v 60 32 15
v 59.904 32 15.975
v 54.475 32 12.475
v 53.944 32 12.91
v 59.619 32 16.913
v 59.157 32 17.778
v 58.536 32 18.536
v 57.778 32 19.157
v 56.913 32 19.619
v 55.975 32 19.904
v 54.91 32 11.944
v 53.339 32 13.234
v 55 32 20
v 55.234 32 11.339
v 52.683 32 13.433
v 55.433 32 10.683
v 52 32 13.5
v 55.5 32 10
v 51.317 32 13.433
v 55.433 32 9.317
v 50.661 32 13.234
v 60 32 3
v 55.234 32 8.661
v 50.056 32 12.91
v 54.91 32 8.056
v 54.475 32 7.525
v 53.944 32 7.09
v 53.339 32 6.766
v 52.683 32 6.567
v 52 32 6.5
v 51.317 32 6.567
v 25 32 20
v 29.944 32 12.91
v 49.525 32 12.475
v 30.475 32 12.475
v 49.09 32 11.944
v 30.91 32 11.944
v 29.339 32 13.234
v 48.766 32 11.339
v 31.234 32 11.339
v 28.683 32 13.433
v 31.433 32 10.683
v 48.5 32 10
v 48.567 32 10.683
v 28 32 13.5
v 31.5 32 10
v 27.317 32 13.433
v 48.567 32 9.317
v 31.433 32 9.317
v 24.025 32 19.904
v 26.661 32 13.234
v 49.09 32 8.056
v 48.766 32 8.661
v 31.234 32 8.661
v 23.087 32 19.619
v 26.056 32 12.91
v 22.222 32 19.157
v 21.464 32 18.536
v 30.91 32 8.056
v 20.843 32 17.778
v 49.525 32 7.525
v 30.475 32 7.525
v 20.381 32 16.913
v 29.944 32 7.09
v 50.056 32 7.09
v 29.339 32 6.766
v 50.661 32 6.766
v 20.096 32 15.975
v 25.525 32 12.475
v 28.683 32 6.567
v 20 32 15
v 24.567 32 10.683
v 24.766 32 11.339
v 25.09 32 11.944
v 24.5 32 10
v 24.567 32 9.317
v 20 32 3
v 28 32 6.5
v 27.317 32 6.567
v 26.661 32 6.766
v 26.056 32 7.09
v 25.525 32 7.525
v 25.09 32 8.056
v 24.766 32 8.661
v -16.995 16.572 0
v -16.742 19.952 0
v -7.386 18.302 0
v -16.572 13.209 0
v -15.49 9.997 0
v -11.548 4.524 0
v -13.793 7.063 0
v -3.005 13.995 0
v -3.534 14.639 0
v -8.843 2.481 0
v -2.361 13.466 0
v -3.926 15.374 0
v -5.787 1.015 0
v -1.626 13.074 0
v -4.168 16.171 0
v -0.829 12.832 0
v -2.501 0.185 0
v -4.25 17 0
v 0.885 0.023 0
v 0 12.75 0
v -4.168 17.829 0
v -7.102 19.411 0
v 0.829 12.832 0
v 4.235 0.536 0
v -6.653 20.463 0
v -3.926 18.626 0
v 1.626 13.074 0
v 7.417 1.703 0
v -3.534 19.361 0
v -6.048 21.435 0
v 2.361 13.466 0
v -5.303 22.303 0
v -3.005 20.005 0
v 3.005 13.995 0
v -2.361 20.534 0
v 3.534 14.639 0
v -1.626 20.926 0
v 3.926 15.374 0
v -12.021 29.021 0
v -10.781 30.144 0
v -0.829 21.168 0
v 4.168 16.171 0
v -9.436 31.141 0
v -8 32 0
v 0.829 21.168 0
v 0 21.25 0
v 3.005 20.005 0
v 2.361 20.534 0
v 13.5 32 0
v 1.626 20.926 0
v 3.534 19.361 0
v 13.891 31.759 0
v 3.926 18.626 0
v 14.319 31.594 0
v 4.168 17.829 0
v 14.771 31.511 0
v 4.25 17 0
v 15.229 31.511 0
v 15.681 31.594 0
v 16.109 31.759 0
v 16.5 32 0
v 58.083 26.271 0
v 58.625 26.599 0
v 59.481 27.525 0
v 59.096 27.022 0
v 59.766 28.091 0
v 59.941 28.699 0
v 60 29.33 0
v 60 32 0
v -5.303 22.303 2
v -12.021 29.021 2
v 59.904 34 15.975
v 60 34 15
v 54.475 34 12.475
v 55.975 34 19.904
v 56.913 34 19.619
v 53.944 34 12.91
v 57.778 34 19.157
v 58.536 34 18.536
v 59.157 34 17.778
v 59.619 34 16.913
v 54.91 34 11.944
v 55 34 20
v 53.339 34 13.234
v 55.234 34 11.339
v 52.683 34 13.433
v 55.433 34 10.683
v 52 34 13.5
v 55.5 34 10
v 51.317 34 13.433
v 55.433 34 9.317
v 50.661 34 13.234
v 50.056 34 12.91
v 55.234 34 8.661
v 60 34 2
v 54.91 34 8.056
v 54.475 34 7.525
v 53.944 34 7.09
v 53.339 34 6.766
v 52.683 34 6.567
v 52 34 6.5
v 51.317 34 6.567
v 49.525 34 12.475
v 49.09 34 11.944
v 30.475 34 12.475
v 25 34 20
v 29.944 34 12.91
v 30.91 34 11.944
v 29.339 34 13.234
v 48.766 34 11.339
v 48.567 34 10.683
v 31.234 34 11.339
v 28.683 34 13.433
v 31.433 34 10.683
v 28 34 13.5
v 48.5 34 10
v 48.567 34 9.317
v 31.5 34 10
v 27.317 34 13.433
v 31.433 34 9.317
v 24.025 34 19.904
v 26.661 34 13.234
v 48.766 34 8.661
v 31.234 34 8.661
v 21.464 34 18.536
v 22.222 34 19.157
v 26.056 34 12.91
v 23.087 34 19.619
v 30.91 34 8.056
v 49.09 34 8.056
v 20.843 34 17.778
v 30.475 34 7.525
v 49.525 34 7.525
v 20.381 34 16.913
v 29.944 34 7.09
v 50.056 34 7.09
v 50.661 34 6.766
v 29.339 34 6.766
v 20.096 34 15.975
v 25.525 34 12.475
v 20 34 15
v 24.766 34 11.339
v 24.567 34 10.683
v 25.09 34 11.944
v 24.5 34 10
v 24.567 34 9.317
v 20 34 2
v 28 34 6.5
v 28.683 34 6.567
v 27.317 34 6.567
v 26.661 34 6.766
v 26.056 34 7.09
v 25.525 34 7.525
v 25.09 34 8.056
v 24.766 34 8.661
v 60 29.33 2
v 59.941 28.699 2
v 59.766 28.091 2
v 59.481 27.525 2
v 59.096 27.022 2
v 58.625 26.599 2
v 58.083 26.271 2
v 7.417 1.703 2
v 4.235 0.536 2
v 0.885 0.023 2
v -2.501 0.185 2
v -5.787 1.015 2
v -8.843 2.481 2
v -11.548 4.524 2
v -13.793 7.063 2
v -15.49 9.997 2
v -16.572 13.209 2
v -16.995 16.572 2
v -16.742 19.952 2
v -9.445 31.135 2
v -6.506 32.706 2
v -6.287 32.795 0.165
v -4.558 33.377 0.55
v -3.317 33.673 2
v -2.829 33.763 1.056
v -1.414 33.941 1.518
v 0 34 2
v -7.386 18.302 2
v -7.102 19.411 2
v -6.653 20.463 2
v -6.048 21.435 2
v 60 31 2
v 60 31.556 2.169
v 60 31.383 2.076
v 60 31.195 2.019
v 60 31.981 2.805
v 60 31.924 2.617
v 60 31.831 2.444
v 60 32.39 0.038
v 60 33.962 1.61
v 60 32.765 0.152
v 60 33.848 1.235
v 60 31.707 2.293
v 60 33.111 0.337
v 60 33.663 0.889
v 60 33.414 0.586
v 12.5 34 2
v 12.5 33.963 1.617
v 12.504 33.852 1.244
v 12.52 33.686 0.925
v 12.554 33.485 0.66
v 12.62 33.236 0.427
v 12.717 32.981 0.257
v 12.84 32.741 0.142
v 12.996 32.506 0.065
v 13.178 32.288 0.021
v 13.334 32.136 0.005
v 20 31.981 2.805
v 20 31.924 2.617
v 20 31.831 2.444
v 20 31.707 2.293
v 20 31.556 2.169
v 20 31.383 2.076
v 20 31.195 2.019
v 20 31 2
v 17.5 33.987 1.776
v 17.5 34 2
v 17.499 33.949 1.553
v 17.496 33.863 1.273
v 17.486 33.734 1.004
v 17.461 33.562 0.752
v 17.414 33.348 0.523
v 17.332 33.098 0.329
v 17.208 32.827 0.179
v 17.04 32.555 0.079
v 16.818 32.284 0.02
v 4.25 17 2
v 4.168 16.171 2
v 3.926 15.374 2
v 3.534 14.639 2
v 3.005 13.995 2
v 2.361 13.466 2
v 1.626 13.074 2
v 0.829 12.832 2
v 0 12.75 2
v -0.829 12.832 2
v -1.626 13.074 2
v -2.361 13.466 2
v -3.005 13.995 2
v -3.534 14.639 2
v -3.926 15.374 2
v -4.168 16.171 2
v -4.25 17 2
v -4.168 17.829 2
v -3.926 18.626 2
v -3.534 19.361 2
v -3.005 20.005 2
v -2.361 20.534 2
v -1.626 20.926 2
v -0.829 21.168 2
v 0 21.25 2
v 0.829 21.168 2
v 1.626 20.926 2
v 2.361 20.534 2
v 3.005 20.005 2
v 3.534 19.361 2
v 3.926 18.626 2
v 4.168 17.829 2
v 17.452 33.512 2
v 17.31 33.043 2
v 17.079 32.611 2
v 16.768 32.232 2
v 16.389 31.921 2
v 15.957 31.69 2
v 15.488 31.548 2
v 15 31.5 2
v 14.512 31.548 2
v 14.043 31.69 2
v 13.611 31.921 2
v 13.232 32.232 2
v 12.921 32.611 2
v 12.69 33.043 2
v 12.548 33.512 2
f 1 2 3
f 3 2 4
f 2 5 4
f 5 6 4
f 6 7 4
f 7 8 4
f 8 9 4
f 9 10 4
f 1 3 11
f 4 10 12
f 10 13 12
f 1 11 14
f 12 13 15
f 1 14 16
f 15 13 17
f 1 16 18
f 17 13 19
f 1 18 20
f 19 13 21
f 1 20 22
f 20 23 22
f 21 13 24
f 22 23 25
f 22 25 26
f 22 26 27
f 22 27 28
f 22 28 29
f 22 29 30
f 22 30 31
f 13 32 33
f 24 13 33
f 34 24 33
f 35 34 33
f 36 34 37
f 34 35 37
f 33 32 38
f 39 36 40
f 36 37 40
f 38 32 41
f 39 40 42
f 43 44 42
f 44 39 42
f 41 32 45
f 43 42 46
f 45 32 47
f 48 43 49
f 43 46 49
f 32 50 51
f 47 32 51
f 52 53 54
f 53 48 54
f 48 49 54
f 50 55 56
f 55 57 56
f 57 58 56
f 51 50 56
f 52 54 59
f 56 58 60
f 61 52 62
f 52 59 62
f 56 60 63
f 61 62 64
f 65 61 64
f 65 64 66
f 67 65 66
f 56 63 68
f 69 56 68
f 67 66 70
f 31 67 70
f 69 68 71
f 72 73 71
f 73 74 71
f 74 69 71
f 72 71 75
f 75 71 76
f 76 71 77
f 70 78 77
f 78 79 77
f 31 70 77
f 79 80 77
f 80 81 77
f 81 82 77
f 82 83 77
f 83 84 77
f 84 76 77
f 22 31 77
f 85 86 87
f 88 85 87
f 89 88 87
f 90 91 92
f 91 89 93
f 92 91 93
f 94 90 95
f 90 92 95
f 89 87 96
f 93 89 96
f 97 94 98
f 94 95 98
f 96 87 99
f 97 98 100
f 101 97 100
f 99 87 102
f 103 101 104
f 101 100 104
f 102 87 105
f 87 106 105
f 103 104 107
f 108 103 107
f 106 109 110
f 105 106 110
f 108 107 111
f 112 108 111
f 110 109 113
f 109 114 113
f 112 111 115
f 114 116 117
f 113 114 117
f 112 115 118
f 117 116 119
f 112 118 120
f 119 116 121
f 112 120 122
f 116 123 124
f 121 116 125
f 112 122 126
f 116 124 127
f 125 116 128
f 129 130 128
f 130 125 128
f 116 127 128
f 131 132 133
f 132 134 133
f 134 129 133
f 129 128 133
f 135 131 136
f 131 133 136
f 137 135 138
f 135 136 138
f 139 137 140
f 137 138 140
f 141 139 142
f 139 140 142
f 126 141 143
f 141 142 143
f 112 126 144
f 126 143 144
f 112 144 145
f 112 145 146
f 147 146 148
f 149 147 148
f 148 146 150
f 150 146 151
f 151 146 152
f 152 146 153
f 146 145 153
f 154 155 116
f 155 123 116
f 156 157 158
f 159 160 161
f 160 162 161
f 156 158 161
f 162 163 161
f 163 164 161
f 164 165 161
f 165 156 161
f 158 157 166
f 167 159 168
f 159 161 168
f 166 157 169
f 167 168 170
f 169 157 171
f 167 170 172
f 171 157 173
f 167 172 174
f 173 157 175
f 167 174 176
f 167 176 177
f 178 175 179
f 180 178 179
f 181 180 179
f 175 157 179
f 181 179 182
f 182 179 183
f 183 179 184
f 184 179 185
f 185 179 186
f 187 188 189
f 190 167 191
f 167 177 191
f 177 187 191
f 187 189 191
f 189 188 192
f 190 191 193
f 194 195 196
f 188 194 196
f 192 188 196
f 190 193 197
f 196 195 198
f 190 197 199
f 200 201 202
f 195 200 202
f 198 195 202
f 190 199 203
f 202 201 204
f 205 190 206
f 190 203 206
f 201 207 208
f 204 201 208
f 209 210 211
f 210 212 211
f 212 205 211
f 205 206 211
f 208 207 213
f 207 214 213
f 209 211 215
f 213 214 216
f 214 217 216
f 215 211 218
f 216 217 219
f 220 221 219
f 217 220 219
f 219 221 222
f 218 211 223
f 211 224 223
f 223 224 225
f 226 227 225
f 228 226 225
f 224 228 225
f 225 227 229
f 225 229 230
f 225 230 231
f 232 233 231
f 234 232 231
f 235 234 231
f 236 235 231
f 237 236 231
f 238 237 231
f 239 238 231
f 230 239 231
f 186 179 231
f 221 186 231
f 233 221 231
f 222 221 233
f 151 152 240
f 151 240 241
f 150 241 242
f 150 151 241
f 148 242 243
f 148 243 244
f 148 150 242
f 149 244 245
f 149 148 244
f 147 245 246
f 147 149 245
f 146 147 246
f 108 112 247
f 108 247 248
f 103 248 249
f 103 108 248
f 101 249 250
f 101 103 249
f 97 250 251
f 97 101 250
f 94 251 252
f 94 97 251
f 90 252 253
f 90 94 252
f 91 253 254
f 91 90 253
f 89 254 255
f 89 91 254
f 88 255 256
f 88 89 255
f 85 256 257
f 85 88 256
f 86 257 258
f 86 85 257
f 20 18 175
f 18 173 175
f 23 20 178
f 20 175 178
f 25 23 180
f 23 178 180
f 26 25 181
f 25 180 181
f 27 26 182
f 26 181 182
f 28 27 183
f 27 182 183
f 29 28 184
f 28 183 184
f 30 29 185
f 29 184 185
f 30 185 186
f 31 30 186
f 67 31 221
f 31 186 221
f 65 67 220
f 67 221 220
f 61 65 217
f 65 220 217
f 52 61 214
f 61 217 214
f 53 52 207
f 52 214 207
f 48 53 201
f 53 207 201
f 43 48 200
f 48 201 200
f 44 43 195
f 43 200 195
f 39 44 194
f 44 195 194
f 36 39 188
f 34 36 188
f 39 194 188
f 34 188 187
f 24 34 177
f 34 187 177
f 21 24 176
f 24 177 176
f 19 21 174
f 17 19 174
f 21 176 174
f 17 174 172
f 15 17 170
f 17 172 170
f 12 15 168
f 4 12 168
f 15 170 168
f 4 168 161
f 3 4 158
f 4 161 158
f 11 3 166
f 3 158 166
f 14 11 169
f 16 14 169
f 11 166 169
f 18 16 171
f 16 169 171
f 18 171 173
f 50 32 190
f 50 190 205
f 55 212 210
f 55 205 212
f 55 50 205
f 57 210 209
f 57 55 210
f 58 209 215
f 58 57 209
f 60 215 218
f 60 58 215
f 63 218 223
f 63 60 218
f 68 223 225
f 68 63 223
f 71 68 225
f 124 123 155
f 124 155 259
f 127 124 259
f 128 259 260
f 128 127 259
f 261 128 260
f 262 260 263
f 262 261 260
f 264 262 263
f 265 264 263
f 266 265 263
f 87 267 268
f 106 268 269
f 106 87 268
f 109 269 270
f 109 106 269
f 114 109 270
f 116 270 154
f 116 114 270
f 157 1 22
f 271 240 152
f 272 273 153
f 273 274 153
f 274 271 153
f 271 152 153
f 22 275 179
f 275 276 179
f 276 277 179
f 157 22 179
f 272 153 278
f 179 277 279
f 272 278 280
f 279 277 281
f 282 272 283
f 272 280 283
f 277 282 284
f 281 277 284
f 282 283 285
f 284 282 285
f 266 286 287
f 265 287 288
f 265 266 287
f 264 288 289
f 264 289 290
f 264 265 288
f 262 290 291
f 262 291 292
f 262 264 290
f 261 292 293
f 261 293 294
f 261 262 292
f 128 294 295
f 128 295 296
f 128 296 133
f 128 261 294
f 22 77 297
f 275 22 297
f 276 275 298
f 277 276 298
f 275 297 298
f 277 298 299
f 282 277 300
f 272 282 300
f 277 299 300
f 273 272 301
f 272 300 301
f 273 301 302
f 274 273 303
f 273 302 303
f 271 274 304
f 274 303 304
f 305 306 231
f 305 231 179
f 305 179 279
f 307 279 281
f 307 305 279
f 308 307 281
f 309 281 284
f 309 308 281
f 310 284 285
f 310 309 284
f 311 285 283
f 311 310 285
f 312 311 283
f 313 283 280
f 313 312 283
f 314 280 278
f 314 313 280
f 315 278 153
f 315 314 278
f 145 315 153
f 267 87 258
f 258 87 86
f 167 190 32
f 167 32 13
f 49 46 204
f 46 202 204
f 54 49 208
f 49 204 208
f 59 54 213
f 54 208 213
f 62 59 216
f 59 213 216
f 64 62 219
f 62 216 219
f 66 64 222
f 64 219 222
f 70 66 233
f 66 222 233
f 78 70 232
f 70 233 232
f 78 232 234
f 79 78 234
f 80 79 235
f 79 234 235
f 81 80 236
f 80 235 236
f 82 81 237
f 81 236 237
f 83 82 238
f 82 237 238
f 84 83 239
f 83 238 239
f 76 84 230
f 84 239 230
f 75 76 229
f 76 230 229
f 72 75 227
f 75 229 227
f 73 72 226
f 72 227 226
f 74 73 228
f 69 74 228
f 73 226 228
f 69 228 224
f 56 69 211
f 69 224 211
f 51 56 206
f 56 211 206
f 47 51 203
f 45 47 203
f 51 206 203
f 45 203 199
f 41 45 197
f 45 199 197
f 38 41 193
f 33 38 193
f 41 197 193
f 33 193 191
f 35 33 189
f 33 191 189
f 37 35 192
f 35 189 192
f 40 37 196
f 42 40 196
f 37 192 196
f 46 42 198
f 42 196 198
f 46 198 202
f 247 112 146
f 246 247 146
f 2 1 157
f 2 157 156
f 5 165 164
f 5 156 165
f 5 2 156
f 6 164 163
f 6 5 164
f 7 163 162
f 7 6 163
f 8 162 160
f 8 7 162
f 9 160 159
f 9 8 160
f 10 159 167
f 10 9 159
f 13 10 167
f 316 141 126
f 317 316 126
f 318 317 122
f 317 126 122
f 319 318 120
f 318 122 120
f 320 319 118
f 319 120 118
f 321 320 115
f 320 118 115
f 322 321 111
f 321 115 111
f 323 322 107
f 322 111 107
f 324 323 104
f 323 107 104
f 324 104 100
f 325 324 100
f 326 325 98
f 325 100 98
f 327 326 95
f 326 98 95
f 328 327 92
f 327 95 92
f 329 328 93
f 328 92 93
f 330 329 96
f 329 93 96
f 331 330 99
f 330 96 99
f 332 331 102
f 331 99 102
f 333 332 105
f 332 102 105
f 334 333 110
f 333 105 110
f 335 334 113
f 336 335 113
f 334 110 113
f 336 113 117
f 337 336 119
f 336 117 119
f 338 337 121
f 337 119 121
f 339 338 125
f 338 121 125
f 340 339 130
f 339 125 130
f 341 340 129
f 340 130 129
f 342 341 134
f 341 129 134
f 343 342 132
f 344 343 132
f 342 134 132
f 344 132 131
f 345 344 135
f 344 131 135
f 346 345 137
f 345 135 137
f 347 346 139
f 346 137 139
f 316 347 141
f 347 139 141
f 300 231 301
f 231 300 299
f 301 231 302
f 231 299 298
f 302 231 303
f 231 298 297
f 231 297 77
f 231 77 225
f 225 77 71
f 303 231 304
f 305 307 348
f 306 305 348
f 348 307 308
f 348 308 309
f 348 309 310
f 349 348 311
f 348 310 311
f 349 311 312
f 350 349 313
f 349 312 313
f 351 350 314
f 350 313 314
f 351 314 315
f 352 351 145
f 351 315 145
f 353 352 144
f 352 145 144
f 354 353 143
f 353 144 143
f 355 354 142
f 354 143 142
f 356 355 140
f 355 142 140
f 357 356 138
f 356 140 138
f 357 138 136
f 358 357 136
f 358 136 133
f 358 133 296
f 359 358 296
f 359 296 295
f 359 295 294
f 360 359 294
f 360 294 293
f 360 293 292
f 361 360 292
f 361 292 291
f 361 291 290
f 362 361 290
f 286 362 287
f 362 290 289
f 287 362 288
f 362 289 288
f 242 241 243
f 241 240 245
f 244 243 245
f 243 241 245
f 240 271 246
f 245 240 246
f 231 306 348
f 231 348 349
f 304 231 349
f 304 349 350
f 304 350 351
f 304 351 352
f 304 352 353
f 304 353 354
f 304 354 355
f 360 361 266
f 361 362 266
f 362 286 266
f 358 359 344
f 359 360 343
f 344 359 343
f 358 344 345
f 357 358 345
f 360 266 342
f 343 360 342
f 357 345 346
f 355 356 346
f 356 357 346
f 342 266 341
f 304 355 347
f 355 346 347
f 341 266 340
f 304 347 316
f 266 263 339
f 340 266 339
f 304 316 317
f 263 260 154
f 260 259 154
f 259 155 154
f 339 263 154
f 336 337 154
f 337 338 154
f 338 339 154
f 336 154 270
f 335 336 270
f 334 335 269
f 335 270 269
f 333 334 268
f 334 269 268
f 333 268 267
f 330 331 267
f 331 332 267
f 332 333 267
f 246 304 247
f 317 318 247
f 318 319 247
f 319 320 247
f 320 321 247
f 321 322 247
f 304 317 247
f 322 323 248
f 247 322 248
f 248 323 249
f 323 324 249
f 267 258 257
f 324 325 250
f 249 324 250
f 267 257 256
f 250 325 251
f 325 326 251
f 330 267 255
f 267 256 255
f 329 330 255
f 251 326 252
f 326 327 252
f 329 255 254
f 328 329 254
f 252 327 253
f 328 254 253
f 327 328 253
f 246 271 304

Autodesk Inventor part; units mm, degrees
sketch "Sketch_10" plane through (0, 0, 0) normal (0, 0, 1) x (1, 0, 0)
  arc A0 (-16.7417, 19.952) -> (7.4171, 1.7034) centre (0, 17) ccw
  line L0 (7.4171, 1.7034) -> (58.0834, 26.2707)
  arc A1 (58.0834, 26.2707) -> (60, 29.33) centre (56.6, 29.33) ccw
  line L1 (60, 29.33) -> (60, 34)
  line L2 (60, 34) -> (0, 34)
  arc A2 (0, 34) -> (-12.0208, 29.0208) centre (0, 17) ccw
  line L3 (-12.0208, 29.0208) -> (-5.3033, 22.3033)
  arc A3 (-5.3033, 22.3033) -> (-7.3861, 18.3024) centre (0, 17) ccw
  line L4 (-7.3861, 18.3024) -> (-16.7417, 19.952)
  circle A4 centre (0, 17) radius 4.25
extrude "Extrusion1" add sketch "Sketch_10" along normal blind 20
sketch "Sketch_1" plane through (0, 0, 0) normal (1, 0, 0) x (0, 1, 0)
  line L0 (39, 25) -> (-5, 25)
  line L1 (-5, 25) -> (-5, -5)
  line L2 (-5, -5) -> (39, -5)
  line L3 (39, -5) -> (39, 25)
  line L4 (34, 20) -> (32, 20)
  line L5 (32, 20) -> (32, 3)
  arc A0 (31, 2) -> (32, 3) centre (31, 3) ccw
  line L6 (31, 2) -> (0, 2)
  line L7 (0, 2) -> (0, 0)
  line L8 (0, 0) -> (32, 0)
  arc A1 (32, 0) -> (34, 2) centre (32, 2) ccw
  line L9 (34, 2) -> (34, 20)
extrude "Extrusion2" cut sketch "Sketch_1" along normal mid plane 188
sketch "Sketch_3" plane through (0, 0, 0) normal (0, 1, 0) x (-1, 0, 0)
  line L0 (22, 25) -> (-65, 25)
  line L1 (-65, 25) -> (-65, -5)
  line L2 (-65, -5) -> (22, -5)
  line L3 (22, -5) -> (22, 25)
  line L4 (17, 2) -> (-20, 2)
  line L5 (-20, 2) -> (-20, 15)
  arc A0 (-20, 15) -> (-25, 20) centre (-25, 15) ccw
  line L6 (-25, 20) -> (-55, 20)
  arc A1 (-55, 20) -> (-60, 15) centre (-55, 15) ccw
  line L7 (-60, 15) -> (-60, 0)
  line L8 (-60, 0) -> (17, 0)
  line L9 (17, 0) -> (17, 2)
extrude "Extrusion3" cut sketch "Sketch_3" along normal blind 34
sketch "Sketch_2" plane through (0, 34, 0) normal (0, 1, 0) x (1, 0, 0)
  circle A0 centre (28, -10) radius 3.5
extrude "Extrusion4" cut sketch "Sketch_2" along normal mid plane 4
sketch "Sketch_4" plane through (0, 34, 0) normal (0, 1, 0) x (1, 0, 0)
  circle A0 centre (52, -10) radius 3.5
extrude "Extrusion5" cut sketch "Sketch_4" along normal mid plane 4
sketch "Sketch_7" plane through (0, 0, 0) normal (0, 0, 1) x (1, 0, 0)
  circle A0 centre (15, 34) radius 2.5
extrude "Extrusion6" cut sketch "Sketch_7" along normal blind 20
ref_plane "fix_end_r_XY" through (0, 17, 0) normal (0, 0, 1) x (1, 0, 0)
ref_plane "fix_end_r_YZ" through (0, 17, 0) normal (1, 0, 0) x (0, 1, 0)
ref_plane "fix_end_r_ZX" through (0, 17, 0) normal (0, 1, 0) x (0, 0, 1)
ref_plane "free_end_r_XY" through (0, 17, 2) normal (0, 0, 1) x (1, 0, 0)
ref_plane "free_end_r_YZ" through (0, 17, 2) normal (1, 0, 0) x (0, 1, 0)
ref_plane "free_end_r_ZX" through (0, 17, 2) normal (0, 1, 0) x (0, 0, 1)
ref_plane "r_XY" through (0, 17, 27.8) normal (0, 0, 1) x (1, 0, 0)
ref_plane "r_YZ" through (0, 17, 27.8) normal (1, 0, 0) x (0, 1, 0)
ref_plane "r_ZX" through (0, 17, 27.8) normal (0, 1, 0) x (0, 0, 1)
properties part number "MHPUS306-Ab_free_right"
